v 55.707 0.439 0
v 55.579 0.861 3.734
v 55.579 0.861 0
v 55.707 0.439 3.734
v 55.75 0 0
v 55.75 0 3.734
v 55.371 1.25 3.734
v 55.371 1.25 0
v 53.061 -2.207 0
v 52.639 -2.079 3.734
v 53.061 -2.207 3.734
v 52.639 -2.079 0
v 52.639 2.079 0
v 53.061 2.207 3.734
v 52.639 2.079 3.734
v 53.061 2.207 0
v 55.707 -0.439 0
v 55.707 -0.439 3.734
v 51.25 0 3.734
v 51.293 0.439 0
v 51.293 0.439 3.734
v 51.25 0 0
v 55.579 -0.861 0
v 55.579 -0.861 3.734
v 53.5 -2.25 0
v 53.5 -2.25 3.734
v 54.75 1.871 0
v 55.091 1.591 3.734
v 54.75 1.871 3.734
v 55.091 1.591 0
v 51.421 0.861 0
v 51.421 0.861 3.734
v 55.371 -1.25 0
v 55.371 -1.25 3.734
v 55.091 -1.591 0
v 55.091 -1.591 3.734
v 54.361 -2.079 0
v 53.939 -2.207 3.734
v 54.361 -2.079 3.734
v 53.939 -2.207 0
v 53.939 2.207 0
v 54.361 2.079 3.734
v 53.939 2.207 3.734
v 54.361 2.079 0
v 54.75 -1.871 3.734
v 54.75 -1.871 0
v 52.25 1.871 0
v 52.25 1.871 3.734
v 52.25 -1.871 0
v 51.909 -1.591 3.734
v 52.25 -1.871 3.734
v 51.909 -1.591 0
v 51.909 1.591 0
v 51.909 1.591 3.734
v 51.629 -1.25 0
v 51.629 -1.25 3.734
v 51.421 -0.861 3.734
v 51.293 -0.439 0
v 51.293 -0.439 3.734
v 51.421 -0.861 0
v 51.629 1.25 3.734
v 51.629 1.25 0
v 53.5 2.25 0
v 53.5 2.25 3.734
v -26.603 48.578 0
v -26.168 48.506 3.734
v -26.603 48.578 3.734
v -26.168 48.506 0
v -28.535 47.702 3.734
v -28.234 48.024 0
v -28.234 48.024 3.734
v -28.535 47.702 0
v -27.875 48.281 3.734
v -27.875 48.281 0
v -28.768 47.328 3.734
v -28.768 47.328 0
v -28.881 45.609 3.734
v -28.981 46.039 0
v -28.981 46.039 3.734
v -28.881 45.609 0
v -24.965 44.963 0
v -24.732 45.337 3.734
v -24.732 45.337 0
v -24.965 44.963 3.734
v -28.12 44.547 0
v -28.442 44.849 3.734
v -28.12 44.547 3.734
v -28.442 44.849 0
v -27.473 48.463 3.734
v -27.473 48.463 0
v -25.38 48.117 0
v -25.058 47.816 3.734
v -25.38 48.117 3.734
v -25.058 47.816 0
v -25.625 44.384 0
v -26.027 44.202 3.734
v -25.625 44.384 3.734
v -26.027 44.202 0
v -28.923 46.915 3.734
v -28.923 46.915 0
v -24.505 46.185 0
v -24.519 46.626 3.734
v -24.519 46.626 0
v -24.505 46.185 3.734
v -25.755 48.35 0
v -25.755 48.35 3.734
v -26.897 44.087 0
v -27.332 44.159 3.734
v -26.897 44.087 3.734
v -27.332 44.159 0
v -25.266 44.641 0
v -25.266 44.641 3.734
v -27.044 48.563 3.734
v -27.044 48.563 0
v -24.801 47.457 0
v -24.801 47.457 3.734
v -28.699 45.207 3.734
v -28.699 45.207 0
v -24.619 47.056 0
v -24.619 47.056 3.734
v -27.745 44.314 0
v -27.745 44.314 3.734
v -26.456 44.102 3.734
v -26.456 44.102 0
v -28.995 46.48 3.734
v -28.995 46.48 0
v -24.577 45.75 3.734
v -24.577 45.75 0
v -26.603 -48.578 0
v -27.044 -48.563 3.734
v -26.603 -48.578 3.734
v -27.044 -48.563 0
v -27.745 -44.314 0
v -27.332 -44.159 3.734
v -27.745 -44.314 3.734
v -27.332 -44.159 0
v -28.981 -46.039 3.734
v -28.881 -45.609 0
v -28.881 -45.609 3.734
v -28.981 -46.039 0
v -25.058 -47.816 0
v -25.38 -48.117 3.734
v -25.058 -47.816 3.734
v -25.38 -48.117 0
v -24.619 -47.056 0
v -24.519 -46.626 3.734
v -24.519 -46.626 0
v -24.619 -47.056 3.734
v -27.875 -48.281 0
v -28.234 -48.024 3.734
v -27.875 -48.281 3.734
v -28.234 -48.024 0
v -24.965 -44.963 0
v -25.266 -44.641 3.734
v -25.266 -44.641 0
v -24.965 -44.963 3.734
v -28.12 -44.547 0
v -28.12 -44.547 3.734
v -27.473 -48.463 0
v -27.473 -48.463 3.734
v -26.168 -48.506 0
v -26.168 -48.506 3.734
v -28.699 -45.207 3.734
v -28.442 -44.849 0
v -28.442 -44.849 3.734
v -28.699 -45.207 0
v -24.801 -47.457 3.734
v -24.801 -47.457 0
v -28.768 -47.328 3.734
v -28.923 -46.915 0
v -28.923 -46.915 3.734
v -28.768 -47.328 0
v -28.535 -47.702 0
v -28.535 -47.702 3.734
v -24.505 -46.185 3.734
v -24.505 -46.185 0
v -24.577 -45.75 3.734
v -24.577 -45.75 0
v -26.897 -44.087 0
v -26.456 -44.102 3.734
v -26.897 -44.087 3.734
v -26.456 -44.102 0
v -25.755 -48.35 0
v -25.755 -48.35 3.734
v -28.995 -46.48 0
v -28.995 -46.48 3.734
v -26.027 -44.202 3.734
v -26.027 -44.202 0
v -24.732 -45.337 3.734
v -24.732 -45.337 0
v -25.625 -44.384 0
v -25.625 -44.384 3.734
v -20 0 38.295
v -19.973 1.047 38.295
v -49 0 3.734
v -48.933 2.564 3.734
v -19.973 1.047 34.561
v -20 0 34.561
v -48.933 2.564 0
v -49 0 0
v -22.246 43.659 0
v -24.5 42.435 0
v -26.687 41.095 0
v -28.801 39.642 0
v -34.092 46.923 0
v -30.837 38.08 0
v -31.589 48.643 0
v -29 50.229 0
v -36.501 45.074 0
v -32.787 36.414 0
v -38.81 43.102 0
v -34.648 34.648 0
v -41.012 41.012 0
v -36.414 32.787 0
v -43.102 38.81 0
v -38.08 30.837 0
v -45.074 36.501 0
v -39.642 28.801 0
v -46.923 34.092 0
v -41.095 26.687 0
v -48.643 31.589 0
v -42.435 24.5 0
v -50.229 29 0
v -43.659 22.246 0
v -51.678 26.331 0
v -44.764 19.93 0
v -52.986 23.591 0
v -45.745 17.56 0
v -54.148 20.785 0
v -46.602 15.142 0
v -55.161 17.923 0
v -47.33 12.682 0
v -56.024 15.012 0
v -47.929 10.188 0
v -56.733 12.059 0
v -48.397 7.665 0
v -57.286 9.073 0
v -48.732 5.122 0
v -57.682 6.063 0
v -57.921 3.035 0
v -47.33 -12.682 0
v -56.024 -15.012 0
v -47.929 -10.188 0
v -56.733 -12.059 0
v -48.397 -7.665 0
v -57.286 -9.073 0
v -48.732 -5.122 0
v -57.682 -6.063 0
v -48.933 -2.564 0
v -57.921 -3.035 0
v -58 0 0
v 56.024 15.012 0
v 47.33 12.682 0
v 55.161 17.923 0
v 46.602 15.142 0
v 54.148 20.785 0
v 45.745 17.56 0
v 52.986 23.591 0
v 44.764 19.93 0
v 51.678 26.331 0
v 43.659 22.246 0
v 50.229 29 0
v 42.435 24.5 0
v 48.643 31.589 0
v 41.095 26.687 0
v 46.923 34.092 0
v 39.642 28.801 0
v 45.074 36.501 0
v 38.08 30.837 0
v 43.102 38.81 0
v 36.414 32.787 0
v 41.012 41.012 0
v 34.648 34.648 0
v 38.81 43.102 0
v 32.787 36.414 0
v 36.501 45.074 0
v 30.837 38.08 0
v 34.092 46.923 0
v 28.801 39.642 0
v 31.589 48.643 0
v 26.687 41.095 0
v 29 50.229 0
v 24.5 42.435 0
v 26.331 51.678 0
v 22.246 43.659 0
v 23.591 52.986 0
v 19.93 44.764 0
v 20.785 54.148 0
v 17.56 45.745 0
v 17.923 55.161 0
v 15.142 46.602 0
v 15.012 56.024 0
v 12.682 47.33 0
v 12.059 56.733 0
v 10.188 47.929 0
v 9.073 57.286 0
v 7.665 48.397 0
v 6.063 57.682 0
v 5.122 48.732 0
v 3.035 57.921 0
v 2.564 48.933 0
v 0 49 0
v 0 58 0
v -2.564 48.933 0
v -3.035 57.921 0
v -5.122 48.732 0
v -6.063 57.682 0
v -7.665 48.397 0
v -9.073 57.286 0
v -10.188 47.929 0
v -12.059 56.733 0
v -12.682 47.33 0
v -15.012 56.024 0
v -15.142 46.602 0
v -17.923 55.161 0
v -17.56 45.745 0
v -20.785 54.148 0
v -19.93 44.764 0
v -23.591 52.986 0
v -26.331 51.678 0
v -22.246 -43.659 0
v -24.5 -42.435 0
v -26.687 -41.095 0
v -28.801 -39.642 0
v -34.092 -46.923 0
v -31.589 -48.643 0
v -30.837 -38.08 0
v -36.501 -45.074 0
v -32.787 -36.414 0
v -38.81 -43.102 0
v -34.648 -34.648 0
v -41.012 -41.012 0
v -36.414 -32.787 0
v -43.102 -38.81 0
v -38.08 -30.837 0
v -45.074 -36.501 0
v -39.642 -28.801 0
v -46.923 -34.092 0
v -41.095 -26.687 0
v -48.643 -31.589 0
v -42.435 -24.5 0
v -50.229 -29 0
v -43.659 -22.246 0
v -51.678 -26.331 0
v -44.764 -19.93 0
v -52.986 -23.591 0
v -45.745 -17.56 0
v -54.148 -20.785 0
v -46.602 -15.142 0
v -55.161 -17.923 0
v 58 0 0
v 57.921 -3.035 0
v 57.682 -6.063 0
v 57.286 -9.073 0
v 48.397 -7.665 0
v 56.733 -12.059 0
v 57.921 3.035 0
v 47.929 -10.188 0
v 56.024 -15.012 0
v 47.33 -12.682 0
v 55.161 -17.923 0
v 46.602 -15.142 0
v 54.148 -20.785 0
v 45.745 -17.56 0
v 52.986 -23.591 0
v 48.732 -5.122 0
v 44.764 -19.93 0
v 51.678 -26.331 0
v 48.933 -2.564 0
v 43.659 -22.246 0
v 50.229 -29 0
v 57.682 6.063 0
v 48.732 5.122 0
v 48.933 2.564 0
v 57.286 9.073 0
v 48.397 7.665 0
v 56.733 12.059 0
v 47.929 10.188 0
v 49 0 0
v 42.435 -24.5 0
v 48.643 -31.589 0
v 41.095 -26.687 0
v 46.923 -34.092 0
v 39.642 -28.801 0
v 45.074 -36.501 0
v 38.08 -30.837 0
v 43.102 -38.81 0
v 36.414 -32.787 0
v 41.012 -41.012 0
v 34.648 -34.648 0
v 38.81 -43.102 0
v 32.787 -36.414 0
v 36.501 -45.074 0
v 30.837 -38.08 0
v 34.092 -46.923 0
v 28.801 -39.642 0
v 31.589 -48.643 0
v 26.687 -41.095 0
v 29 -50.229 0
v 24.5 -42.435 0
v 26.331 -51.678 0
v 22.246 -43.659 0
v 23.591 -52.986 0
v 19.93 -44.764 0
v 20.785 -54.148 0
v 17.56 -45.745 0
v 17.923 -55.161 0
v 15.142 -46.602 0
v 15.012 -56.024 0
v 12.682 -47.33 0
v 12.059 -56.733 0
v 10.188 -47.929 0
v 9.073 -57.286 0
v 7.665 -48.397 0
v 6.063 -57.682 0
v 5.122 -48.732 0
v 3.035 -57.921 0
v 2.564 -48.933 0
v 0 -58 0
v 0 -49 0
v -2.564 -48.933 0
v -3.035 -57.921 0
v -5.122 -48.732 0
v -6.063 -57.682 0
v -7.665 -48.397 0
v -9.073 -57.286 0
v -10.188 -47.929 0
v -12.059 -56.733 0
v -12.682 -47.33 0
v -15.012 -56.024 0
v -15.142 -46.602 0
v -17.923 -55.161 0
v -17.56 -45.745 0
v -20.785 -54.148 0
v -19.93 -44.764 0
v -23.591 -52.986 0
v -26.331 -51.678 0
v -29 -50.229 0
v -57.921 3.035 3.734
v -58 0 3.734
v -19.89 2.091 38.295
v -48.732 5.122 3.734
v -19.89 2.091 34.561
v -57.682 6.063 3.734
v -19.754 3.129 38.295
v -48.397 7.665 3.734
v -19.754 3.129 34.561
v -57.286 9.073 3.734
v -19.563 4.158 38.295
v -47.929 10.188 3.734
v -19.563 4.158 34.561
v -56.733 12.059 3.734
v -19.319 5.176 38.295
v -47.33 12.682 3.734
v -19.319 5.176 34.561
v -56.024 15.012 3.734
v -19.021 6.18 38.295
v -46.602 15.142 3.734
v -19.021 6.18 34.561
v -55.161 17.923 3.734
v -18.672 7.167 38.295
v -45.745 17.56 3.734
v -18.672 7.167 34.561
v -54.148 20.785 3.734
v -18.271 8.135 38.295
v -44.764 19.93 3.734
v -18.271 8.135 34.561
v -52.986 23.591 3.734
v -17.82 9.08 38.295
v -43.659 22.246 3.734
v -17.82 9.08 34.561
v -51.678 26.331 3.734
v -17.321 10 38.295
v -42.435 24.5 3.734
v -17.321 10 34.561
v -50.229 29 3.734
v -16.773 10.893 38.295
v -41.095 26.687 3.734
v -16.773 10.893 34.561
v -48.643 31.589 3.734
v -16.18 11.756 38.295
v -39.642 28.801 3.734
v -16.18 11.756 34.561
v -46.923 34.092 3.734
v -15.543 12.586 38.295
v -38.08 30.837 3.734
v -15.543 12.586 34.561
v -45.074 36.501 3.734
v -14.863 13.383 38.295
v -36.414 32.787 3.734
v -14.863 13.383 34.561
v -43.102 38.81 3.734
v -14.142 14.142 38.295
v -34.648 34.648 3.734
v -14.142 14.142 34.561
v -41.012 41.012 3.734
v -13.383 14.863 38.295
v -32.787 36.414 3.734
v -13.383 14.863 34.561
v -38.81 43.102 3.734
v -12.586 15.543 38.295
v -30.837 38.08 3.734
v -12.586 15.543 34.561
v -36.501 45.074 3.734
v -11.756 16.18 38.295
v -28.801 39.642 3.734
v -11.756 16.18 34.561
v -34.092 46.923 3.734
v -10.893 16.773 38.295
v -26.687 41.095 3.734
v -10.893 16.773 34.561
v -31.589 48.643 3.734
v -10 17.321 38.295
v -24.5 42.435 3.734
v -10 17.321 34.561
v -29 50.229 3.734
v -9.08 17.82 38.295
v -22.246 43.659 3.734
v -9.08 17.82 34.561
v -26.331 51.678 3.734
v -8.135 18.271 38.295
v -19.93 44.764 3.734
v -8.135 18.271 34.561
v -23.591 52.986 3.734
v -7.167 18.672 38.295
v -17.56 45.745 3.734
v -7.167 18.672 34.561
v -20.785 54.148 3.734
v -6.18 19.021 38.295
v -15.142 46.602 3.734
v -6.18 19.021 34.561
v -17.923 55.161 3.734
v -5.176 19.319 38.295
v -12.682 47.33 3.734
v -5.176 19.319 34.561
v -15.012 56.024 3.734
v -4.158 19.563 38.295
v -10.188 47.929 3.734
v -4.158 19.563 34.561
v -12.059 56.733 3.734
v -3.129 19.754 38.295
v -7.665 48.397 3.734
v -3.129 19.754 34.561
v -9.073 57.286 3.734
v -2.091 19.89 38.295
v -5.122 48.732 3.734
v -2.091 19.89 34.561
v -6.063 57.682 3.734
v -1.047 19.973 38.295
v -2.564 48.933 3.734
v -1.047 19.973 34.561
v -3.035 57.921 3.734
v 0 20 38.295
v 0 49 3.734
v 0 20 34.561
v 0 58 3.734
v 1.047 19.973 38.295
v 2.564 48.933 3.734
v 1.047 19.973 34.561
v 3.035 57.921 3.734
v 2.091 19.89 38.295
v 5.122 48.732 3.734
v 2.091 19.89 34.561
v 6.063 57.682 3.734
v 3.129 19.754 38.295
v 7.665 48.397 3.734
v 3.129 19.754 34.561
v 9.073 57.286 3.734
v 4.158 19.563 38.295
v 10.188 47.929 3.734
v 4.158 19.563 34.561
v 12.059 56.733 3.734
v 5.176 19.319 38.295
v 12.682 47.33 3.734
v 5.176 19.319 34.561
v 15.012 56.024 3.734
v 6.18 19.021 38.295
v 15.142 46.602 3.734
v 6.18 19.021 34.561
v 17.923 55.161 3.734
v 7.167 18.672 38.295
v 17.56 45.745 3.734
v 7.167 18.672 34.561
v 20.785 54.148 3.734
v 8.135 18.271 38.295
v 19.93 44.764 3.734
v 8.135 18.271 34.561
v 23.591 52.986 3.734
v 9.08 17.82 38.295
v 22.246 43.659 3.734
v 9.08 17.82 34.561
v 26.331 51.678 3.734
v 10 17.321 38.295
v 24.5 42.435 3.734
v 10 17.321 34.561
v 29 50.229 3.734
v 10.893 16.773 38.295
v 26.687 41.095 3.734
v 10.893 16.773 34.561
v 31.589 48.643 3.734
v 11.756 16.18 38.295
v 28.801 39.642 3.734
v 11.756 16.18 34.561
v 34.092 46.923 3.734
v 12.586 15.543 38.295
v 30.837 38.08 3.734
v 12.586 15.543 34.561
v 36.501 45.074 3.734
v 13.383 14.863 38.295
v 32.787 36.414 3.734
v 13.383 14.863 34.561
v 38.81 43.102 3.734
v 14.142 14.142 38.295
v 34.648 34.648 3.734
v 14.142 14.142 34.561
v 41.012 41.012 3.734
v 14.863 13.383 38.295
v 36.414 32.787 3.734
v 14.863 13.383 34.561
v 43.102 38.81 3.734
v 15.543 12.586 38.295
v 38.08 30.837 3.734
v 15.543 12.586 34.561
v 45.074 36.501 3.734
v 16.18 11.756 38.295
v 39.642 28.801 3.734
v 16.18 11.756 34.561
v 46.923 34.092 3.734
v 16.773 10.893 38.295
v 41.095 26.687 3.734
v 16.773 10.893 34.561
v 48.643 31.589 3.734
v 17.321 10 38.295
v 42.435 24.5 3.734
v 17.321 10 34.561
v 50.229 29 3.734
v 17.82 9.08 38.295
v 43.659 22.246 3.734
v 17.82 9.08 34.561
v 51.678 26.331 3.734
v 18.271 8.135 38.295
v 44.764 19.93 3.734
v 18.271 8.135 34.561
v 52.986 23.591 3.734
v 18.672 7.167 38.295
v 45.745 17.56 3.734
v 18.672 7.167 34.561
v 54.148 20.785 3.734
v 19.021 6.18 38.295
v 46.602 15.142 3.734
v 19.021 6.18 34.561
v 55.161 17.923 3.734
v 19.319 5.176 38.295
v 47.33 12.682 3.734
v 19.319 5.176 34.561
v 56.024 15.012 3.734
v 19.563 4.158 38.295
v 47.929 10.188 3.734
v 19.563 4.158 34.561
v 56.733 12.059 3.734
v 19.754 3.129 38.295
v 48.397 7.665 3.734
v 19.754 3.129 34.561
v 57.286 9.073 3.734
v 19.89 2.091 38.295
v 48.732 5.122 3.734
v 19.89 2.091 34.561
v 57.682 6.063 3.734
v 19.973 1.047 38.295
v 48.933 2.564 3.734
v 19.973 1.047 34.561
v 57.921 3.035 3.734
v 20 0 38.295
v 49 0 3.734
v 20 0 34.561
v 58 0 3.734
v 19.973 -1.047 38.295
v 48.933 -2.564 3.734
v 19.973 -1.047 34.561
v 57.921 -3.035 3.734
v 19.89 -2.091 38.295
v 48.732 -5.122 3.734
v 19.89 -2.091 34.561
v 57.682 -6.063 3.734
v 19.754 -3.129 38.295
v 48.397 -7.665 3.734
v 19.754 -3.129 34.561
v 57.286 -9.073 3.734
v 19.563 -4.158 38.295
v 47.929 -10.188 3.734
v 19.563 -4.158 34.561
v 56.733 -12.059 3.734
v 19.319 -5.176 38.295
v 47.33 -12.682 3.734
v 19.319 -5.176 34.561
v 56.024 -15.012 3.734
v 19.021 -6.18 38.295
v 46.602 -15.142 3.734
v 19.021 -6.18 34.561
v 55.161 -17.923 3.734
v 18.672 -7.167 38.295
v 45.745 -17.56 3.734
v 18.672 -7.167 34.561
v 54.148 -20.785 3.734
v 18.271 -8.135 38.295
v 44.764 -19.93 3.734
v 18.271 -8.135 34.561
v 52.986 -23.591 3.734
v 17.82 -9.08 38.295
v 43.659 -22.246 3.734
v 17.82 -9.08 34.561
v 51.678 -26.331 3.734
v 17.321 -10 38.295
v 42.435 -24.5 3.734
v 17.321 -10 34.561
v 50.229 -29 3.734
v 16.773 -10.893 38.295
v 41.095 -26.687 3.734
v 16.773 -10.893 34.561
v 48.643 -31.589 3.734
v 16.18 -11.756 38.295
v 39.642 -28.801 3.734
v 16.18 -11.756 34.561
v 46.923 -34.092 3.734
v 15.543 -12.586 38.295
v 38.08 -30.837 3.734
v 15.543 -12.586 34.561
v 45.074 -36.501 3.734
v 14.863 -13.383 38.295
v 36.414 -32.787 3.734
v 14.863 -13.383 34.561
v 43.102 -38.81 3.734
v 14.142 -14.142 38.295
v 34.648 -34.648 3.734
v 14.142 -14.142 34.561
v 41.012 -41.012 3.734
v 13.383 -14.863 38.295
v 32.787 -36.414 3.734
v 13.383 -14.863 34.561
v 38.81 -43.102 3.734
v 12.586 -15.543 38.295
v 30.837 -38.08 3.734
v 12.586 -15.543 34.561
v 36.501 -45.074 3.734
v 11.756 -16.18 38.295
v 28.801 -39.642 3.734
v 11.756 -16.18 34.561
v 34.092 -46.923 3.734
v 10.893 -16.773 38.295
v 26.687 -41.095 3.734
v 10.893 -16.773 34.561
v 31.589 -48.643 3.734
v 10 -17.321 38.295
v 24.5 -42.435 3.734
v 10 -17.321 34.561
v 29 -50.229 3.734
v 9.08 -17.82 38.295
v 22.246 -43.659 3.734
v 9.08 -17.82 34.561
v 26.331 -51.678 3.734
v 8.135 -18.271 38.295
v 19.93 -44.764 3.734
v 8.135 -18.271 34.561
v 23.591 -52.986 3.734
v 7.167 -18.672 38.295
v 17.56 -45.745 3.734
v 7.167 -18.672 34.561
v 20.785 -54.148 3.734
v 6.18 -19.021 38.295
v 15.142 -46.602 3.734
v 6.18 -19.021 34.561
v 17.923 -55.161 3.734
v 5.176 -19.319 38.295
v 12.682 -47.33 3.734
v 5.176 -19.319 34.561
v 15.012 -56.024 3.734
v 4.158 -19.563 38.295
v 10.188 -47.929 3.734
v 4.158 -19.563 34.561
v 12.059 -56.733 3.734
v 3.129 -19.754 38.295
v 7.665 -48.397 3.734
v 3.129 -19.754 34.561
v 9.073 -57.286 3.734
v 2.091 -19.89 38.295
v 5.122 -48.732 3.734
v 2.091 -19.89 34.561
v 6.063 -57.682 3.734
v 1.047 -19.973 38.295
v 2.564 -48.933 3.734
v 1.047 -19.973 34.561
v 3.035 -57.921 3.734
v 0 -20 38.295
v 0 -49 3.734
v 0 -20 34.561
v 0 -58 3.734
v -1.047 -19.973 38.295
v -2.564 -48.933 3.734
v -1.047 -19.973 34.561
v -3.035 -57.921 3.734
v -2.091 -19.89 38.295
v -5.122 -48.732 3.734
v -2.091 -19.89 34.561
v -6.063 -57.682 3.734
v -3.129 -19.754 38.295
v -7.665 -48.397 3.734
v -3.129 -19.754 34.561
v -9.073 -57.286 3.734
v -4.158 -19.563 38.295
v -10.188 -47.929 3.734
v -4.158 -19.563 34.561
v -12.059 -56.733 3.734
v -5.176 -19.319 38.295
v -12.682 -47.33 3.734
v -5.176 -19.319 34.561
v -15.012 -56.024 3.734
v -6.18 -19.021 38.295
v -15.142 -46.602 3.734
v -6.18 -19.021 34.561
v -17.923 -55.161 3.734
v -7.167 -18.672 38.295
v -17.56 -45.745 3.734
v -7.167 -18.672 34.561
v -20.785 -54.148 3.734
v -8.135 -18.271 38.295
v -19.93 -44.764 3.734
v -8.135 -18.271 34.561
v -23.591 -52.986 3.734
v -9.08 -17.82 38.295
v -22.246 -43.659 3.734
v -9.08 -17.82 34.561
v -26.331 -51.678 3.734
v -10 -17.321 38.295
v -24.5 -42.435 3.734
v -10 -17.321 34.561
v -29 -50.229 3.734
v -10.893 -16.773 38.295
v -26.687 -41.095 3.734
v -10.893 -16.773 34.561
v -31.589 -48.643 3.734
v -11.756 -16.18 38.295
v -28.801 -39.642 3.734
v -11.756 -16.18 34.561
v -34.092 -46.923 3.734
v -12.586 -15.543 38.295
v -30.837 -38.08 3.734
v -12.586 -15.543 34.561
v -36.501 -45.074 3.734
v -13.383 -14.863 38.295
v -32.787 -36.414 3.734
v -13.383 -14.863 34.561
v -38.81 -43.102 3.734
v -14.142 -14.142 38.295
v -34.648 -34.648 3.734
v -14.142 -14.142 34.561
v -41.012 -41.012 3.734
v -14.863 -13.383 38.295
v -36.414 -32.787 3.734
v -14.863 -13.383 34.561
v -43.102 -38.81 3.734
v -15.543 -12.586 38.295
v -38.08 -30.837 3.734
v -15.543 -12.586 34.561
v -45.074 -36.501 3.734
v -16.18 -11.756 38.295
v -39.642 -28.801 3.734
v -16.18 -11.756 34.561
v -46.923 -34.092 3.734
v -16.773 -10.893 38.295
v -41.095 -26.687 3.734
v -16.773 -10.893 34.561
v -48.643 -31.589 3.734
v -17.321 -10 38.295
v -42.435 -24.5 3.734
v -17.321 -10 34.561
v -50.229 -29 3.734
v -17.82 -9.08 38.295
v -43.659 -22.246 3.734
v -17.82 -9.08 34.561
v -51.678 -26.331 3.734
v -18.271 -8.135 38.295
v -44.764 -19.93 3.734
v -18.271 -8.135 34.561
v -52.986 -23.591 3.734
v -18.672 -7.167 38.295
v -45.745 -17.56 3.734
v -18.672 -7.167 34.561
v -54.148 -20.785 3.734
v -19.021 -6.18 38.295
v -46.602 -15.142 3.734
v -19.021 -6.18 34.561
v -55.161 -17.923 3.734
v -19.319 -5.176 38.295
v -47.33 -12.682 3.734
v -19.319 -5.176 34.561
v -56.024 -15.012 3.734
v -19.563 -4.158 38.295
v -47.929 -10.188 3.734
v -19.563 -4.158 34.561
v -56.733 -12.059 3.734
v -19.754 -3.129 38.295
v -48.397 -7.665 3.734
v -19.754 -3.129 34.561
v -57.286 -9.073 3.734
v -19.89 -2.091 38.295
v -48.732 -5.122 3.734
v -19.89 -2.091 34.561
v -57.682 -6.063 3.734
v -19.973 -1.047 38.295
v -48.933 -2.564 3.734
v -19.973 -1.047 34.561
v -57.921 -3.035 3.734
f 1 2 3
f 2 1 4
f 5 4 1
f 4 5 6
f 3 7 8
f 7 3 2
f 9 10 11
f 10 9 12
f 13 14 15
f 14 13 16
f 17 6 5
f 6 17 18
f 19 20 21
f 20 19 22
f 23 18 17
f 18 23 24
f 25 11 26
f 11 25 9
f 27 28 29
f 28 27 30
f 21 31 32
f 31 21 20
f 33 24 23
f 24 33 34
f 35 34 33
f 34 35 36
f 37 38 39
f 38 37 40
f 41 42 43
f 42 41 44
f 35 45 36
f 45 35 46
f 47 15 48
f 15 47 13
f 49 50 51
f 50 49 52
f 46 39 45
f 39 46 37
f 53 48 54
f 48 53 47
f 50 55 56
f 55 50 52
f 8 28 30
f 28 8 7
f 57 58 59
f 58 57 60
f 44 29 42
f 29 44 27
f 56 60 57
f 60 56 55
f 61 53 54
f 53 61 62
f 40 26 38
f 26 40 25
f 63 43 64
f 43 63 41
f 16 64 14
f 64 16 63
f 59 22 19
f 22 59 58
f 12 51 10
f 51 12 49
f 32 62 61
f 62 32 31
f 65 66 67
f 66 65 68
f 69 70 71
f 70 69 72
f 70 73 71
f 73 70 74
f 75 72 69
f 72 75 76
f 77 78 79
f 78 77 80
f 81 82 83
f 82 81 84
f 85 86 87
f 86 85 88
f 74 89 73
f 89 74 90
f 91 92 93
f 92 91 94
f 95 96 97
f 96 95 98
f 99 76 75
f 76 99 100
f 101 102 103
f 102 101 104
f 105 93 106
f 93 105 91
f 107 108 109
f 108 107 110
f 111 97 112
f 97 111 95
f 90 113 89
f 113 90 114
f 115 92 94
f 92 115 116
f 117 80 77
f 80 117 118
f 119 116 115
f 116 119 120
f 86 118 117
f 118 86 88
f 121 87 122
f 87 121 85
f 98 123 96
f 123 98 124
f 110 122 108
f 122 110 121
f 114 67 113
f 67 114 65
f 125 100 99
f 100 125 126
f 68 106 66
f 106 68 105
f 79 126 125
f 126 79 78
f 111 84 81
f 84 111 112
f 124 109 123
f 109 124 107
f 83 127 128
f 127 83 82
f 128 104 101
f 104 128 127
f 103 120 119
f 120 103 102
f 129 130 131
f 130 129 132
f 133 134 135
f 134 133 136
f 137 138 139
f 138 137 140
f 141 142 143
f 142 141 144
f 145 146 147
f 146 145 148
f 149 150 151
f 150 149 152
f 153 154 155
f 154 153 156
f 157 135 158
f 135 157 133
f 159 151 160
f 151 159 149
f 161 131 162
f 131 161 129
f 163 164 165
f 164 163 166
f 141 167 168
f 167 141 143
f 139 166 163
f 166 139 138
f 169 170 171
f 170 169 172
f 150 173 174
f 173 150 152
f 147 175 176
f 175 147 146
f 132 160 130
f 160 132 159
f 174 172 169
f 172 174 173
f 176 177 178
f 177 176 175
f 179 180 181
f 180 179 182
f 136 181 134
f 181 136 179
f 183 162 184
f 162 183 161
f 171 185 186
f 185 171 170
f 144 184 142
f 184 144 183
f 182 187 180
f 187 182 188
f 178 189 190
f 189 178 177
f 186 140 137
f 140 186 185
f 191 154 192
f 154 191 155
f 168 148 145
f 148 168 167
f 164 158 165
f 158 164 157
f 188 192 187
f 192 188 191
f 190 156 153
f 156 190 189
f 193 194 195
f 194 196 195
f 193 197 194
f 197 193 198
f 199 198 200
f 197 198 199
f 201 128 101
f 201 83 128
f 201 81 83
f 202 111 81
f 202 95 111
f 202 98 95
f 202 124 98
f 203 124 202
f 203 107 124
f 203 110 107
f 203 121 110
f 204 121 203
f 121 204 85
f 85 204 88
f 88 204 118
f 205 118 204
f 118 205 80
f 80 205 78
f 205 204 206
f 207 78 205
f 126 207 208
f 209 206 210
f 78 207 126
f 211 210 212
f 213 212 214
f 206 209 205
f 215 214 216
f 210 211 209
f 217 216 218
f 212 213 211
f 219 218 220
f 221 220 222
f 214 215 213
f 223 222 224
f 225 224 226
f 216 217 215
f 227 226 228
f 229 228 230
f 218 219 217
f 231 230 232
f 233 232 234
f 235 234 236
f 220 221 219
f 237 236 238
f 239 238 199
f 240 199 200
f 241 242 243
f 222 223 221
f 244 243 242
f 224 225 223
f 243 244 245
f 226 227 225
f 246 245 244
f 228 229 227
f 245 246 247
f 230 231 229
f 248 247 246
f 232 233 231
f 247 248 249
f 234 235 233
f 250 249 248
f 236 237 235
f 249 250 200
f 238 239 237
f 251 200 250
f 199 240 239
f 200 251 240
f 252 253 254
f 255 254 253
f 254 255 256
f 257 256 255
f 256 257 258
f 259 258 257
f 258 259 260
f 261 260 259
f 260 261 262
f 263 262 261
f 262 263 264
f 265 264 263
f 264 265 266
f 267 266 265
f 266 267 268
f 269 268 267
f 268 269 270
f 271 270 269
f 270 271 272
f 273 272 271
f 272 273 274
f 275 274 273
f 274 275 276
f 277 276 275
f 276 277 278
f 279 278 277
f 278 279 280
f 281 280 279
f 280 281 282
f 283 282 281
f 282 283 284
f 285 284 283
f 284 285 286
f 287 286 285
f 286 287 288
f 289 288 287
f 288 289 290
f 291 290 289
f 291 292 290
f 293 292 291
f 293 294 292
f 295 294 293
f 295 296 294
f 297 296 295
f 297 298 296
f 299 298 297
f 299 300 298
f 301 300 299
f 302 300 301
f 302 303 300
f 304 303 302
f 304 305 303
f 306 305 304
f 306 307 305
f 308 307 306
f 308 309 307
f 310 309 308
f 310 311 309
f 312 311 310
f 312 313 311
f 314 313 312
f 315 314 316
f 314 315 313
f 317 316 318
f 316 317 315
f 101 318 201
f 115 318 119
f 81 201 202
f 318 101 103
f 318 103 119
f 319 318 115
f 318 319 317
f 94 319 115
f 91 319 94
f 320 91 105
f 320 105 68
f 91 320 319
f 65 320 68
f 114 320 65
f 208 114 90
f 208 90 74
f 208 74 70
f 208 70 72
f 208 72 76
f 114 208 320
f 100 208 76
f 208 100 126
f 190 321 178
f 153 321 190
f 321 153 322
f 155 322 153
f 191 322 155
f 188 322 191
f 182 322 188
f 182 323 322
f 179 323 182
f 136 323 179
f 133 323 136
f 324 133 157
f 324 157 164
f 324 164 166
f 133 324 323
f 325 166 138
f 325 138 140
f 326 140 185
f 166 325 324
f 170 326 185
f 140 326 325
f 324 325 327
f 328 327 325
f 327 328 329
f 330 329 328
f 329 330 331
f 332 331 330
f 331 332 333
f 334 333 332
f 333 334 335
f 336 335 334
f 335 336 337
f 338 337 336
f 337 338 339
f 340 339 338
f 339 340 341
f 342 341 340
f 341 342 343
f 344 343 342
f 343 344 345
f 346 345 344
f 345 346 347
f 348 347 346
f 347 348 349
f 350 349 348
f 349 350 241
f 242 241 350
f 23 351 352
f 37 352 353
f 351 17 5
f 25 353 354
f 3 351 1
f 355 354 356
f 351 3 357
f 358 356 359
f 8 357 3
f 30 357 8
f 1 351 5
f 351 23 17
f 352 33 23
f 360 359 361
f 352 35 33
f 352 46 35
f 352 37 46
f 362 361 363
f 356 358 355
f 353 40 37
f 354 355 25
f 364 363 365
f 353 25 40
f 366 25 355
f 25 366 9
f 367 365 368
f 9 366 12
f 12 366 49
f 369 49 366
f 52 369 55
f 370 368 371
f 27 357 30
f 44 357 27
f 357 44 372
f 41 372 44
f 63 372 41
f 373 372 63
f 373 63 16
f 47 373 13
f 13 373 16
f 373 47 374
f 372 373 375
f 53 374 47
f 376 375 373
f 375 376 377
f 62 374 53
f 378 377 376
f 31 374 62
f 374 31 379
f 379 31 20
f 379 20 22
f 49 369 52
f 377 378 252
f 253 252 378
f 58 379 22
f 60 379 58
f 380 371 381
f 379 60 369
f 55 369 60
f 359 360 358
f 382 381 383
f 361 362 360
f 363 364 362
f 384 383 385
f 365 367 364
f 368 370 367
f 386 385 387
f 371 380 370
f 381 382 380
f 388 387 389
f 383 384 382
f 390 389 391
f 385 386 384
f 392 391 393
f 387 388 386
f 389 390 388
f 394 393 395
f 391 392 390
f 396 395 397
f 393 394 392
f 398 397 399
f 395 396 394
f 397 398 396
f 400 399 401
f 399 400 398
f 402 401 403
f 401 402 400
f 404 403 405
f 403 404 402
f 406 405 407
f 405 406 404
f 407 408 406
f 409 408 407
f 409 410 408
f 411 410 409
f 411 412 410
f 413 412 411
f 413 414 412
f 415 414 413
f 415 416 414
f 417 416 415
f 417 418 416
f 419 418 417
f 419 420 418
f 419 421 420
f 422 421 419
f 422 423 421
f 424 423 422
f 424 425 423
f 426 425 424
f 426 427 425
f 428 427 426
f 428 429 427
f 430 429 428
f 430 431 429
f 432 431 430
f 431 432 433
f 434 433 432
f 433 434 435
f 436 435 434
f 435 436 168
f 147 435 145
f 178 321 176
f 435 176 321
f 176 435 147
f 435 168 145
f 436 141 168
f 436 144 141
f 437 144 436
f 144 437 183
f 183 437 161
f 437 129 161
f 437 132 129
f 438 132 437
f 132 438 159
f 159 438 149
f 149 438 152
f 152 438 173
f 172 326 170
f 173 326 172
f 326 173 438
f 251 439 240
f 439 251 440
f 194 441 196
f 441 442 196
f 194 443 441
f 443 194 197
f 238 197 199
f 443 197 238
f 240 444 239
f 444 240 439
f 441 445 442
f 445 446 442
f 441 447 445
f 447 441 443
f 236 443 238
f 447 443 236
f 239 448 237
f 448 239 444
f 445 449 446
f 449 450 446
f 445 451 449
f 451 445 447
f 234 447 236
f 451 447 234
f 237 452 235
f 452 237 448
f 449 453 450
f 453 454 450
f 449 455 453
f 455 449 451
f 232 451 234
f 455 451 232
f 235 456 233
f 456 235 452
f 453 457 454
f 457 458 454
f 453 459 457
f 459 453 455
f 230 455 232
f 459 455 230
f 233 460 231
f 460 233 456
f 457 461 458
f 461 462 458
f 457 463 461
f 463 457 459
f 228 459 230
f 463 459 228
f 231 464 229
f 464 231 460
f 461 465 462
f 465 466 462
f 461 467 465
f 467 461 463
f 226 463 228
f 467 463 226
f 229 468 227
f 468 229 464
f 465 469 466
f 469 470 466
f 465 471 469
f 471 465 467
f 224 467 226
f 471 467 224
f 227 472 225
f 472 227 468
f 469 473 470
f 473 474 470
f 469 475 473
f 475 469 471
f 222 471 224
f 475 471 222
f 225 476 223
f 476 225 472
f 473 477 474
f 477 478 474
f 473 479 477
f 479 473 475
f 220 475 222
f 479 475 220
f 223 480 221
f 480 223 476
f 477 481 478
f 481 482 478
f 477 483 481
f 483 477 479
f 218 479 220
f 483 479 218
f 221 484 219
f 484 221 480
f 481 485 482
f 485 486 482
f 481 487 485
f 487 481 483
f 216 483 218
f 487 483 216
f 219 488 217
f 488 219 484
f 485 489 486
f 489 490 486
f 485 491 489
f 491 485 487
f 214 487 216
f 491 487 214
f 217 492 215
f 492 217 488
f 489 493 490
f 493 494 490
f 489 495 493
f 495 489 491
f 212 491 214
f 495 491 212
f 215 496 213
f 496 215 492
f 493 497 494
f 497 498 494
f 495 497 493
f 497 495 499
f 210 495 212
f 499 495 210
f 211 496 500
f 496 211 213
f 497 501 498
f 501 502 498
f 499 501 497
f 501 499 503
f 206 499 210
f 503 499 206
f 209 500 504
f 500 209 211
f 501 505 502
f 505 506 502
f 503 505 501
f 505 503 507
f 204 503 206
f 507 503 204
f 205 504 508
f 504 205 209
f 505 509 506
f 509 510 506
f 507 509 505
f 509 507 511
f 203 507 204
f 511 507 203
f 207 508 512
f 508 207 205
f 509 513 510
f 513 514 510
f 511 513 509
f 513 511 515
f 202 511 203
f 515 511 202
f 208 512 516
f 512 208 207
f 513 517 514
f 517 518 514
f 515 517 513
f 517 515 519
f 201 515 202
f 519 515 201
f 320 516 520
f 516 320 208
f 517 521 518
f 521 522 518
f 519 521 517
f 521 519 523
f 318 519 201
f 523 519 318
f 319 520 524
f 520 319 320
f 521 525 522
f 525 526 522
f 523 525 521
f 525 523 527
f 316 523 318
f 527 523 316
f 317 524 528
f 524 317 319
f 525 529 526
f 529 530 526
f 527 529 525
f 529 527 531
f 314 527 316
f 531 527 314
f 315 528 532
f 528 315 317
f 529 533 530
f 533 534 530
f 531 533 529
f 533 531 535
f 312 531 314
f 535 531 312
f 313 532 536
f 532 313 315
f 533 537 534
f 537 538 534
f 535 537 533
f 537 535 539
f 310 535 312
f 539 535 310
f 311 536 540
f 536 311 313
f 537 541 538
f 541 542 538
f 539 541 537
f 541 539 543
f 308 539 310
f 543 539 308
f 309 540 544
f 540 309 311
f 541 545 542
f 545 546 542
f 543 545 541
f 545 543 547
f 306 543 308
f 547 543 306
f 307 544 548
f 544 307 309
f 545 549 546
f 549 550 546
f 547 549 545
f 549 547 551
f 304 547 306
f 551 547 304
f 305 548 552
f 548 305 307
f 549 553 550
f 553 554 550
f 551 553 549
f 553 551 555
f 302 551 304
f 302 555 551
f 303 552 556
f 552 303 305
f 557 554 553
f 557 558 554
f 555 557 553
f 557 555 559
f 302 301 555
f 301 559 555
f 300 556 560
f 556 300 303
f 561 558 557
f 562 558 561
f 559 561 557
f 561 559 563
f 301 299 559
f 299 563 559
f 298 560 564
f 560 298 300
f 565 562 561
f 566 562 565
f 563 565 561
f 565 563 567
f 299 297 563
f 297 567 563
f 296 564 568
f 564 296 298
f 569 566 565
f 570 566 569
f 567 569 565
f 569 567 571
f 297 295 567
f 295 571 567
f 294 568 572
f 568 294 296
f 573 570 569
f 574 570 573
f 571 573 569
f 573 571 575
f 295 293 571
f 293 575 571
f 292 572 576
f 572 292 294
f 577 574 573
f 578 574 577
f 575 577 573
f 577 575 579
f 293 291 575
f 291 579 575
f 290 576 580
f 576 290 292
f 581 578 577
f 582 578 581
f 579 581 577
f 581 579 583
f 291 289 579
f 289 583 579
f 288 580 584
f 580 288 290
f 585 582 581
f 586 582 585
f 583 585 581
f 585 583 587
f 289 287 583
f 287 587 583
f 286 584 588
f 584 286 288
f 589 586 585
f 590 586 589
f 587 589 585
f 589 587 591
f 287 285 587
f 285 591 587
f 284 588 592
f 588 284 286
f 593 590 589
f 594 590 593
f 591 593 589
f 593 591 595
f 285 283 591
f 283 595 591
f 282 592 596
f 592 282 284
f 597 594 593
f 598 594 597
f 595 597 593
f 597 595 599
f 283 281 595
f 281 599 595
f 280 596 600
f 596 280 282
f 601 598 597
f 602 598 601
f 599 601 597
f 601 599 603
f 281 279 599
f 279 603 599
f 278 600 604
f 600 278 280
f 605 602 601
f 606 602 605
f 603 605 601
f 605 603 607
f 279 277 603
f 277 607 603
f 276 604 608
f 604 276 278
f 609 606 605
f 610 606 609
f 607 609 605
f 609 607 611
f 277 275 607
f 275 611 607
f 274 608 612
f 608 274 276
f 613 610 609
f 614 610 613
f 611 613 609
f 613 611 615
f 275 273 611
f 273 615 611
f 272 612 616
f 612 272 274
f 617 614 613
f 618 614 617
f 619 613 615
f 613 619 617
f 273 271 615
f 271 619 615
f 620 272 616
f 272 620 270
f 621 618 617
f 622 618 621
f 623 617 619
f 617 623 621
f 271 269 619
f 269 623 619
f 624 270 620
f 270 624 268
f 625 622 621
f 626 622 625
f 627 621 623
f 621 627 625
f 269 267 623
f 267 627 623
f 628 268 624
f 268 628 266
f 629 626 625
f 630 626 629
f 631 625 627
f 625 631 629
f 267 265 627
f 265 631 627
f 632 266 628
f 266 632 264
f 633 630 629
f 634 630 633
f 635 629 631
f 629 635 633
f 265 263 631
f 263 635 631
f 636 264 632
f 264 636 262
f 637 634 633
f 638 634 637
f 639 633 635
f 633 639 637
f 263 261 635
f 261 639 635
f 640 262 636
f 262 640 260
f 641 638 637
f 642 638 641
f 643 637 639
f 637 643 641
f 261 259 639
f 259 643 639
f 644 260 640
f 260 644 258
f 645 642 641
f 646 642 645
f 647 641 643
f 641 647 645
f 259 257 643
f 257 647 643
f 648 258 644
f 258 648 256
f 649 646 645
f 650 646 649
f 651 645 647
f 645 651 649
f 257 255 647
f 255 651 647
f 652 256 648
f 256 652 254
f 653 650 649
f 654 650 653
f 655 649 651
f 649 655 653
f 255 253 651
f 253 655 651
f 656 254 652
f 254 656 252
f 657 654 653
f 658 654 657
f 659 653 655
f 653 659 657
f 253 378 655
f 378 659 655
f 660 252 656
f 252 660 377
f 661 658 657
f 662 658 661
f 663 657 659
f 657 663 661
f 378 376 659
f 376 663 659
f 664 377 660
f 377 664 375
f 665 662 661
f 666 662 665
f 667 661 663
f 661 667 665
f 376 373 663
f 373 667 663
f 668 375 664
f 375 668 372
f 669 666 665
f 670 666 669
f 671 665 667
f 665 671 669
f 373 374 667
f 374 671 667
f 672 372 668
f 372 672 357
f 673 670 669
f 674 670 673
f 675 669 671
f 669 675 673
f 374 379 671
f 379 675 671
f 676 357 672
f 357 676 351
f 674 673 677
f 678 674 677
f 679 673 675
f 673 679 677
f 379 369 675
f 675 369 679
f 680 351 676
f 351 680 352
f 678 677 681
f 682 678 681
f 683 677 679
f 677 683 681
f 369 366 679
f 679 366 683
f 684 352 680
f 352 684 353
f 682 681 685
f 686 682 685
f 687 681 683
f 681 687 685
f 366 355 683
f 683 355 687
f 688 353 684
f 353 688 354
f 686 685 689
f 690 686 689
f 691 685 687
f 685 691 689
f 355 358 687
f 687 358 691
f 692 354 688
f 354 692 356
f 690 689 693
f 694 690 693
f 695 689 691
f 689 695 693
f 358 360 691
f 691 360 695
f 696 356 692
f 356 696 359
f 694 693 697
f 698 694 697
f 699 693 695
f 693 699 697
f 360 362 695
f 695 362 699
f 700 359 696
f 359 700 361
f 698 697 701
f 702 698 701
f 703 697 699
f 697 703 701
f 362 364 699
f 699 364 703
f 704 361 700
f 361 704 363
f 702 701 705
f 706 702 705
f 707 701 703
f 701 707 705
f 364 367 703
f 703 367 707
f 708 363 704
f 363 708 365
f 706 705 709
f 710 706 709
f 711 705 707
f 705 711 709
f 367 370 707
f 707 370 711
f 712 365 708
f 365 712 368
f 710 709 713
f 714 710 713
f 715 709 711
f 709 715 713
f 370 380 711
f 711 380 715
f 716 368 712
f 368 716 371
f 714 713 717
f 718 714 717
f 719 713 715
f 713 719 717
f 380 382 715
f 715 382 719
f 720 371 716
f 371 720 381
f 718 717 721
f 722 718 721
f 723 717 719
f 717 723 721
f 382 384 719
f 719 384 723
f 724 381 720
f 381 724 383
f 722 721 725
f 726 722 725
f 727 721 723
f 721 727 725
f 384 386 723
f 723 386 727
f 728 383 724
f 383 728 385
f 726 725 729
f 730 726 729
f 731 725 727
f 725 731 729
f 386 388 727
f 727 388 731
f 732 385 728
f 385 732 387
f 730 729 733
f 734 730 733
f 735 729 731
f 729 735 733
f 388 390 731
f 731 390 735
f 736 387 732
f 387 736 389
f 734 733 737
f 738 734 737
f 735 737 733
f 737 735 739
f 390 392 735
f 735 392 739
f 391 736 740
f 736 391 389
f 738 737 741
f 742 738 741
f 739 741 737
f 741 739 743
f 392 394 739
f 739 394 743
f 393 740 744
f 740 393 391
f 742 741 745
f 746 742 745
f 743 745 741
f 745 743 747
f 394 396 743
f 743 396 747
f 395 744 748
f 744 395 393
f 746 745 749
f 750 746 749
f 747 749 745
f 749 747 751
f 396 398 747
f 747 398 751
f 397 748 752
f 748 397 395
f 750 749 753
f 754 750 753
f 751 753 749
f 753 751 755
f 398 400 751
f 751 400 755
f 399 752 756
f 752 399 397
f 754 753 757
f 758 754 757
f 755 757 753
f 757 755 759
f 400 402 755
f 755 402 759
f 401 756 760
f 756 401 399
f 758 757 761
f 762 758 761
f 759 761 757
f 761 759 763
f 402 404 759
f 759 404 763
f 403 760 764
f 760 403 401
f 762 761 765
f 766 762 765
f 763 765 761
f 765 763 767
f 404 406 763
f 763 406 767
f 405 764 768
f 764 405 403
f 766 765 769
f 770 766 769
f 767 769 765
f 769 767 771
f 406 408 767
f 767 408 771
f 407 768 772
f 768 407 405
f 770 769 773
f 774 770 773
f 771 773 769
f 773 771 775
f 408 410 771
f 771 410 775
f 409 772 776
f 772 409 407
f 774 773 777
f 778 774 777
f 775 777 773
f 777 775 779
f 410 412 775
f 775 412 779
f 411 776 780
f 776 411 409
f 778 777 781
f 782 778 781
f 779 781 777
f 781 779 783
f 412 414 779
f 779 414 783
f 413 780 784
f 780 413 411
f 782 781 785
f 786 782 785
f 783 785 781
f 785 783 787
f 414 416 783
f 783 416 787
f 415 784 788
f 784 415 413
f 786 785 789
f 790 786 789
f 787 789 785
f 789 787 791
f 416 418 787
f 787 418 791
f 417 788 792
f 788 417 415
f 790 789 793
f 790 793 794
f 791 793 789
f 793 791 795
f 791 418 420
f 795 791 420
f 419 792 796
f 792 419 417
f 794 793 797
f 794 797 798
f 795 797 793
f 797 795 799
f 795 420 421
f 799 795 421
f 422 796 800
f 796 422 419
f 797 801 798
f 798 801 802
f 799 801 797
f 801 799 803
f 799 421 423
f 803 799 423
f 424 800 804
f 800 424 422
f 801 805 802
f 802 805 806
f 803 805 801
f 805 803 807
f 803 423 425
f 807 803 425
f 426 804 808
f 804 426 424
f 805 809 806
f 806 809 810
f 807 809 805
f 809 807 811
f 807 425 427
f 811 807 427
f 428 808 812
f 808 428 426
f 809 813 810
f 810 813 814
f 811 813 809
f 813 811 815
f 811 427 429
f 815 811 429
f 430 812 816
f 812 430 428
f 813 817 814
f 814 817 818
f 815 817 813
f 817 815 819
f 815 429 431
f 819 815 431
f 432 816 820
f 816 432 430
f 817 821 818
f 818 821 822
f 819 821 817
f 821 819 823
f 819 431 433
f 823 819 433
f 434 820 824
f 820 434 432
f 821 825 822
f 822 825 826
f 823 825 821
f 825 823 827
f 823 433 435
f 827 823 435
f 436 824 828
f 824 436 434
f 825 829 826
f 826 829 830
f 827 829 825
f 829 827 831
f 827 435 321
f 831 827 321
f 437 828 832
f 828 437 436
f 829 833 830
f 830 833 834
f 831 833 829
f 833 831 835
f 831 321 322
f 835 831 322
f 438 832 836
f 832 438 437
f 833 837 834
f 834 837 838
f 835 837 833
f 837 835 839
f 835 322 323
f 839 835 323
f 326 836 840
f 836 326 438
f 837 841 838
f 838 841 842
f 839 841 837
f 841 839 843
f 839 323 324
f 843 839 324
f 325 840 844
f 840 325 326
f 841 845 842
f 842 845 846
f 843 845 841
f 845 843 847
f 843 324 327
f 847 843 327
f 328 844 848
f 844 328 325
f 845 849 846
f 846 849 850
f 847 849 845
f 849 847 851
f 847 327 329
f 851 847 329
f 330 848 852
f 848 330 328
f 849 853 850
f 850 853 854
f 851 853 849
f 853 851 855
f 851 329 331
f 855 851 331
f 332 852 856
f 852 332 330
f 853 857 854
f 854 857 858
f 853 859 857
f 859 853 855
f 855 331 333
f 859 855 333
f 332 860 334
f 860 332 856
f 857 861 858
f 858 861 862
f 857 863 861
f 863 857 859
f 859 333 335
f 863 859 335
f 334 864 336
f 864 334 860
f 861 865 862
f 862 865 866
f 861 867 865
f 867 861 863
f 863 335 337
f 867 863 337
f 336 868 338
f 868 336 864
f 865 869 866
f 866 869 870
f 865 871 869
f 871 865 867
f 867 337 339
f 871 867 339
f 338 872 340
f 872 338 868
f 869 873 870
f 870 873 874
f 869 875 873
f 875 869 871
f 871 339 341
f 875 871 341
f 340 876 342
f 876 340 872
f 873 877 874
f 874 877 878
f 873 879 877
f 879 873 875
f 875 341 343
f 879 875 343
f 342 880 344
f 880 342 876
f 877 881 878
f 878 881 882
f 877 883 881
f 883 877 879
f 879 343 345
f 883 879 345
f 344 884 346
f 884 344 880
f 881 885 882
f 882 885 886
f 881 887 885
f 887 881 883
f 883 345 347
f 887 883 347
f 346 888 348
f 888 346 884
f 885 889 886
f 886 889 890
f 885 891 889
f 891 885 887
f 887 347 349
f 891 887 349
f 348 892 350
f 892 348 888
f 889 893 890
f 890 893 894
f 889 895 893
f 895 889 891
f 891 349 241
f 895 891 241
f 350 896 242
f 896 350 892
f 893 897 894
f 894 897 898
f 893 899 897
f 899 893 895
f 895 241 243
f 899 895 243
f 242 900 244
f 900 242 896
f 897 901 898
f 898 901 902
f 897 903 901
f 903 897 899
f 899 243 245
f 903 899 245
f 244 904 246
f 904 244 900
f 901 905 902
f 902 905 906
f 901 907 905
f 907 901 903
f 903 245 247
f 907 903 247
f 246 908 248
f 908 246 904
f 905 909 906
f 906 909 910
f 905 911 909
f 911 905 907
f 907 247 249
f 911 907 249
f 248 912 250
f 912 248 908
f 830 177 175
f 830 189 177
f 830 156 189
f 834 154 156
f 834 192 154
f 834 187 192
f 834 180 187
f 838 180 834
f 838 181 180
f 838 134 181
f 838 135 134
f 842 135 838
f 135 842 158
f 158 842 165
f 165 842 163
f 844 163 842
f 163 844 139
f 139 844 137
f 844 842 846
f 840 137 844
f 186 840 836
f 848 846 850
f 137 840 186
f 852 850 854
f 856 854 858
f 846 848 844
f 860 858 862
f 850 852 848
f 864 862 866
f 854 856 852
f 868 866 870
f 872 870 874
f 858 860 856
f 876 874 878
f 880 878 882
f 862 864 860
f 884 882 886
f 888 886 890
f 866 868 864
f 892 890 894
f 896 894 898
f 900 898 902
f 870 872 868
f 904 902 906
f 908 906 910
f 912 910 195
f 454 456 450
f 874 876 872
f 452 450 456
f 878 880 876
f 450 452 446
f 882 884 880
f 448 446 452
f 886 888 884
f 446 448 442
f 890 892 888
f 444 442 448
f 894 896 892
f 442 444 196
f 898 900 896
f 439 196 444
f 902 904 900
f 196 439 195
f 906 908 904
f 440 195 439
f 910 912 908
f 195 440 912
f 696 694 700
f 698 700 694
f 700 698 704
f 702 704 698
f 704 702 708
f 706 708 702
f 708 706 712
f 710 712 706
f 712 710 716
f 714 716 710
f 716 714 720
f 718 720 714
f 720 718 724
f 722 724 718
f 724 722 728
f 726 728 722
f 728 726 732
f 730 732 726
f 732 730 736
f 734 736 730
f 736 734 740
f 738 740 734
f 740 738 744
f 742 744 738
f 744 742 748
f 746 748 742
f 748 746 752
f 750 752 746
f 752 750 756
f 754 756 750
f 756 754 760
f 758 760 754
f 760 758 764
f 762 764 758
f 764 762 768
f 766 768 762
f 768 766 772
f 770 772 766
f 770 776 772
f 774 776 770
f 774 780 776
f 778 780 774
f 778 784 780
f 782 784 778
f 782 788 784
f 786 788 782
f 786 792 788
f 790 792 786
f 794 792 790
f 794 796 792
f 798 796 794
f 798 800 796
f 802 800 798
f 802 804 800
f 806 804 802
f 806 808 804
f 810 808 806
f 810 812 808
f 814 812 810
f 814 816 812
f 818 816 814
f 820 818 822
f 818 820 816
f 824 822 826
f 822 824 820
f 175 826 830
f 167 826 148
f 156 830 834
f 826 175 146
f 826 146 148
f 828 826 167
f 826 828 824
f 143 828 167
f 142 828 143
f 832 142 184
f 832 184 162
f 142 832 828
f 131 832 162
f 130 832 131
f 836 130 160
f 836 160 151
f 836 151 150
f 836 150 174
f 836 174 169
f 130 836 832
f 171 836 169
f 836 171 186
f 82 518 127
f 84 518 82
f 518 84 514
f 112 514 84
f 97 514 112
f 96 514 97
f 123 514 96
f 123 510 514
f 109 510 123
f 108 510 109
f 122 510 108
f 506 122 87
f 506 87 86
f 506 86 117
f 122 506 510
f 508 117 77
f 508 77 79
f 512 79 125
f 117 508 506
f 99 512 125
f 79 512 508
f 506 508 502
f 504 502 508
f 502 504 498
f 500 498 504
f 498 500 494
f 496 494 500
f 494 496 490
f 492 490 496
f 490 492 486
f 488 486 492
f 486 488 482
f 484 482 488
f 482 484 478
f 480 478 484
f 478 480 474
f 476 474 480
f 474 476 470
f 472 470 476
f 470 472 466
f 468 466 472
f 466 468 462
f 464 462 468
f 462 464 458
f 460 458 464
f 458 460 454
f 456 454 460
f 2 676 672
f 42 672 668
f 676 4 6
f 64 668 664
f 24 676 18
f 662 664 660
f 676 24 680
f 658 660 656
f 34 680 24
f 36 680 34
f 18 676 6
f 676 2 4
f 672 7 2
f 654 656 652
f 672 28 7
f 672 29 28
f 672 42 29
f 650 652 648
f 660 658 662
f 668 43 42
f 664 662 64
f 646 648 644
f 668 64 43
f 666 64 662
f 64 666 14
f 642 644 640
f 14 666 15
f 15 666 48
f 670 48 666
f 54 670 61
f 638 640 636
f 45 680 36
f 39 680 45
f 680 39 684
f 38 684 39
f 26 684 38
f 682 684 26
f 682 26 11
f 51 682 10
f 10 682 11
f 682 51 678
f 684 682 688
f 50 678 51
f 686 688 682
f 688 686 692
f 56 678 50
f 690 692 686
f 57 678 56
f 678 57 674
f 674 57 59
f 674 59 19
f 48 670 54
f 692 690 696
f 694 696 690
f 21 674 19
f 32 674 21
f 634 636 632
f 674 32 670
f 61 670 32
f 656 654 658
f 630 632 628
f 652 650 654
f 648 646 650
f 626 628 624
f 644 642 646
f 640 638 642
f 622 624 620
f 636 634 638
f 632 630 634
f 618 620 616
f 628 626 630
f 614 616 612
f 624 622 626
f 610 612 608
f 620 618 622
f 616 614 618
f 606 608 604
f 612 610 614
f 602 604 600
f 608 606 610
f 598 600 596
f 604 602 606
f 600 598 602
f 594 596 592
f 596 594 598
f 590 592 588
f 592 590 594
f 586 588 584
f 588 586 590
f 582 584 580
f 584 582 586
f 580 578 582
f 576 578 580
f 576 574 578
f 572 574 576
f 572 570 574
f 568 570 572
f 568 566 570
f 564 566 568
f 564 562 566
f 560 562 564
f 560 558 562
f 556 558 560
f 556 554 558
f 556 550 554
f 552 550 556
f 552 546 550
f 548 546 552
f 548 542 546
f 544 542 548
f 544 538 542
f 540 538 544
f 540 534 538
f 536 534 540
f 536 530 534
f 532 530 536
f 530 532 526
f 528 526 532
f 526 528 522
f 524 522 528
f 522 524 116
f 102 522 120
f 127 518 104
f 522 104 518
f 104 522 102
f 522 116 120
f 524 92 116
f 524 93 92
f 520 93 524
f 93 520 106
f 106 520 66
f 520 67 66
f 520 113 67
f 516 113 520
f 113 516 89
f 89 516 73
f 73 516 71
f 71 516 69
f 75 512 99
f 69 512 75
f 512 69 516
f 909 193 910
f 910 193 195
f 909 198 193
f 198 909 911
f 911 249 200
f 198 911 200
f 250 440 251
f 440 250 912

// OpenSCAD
// Passive radiation shield (Stevenson-style louver stack) for weather-station sensors - original design (Brian Sacco)
// Stack of identical louver plates on three M4 threaded rods, printed as separate parts.
// Every part prints as oriented with no supports: cones lean at 40 degrees from vertical, rims sit flat on the bed.
part  = "plate";   // "plate", "cap", "spacers", "base_dht22", "base_probe"
rim_r = 58;        // outer radius (OD 116 mm)
flat  = 9;         // flat rim width that carries the rod holes
cone_a = 50;       // cone angle from horizontal (40 deg from vertical: self-supporting)
t     = 2.4;       // plate thickness measured perpendicular to the cone
r_in  = 20;        // chimney radius where the sensor sits (plate hole, 40 mm)
rod_d = 4.5;       // M4 threaded rod clearance hole
pitch = 14;        // plate to plate spacing along the rods
base_t = 4;
$fn = 120;

rod_r = rim_r - flat / 2;                     // radius of the three rod holes
tv    = t / cos(cone_a);                      // vertical thickness of the cone shell
sl    = tan(cone_a);
r0    = rim_r - flat;                         // where the flat rim ends and the cone starts
spacer_len = pitch - tv;

module rods(h) { for (a = [0, 120, 240]) rotate(a) translate([rod_r, 0, -1]) cylinder(d = rod_d, h = h + 2, $fn = 32); }

module plate() {
    difference() {
        rotate_extrude() polygon([[rim_r, 0], [r0, 0], [r_in, (r0 - r_in) * sl], [r_in, (r0 - r_in) * sl + tv], [r0, tv], [rim_r, tv]]);
        rods(tv);
    }
}
module cap() {
    difference() {
        rotate_extrude() polygon([[rim_r, 0], [r0, 0], [0, r0 * sl], [0, r0 * sl + tv], [r0, tv], [rim_r, tv]]);
        rods(tv);
    }
}
module spacers() {   // 18 sleeves (3 rods x 6 gaps) standing on the bed
    for (i = [0 : 5], j = [0 : 2]) translate([i * 11, j * 11, 0]) difference() {
        cylinder(d = 8, h = spacer_len, $fn = 48);
        translate([0, 0, -1]) cylinder(d = rod_d, h = spacer_len + 2, $fn = 32);
    }
}
module base(kind) {
    difference() {
        union() {
            cylinder(r = rim_r, h = base_t);
            cylinder(r = 22, h = 10);                       // central pad for the sensor
        }
        rods(base_t);
        if (kind == "dht22") {
            // DHT22 / AM2302 body 15.1 x 25 x 7.7 mm + 0.6 mm clearance; 6 mm cable hole down through the floor at the pin end
            translate([-15.7 / 2, -25.6 / 2, 1.8]) cube([15.7, 25.6, 10]);
            translate([0, 25.6 / 2 - 4, -1]) cylinder(d = 6, h = 5, $fn = 32);
        } else {
            translate([0, 0, -1]) cylinder(d = 6.4, h = 12);   // 6 mm stainless DS18B20 probe + 0.4 mm
        }
    }
}

if (part == "plate") plate();
else if (part == "cap") cap();
else if (part == "spacers") spacers();
else if (part == "base_dht22") base("dht22");
else base("probe");
